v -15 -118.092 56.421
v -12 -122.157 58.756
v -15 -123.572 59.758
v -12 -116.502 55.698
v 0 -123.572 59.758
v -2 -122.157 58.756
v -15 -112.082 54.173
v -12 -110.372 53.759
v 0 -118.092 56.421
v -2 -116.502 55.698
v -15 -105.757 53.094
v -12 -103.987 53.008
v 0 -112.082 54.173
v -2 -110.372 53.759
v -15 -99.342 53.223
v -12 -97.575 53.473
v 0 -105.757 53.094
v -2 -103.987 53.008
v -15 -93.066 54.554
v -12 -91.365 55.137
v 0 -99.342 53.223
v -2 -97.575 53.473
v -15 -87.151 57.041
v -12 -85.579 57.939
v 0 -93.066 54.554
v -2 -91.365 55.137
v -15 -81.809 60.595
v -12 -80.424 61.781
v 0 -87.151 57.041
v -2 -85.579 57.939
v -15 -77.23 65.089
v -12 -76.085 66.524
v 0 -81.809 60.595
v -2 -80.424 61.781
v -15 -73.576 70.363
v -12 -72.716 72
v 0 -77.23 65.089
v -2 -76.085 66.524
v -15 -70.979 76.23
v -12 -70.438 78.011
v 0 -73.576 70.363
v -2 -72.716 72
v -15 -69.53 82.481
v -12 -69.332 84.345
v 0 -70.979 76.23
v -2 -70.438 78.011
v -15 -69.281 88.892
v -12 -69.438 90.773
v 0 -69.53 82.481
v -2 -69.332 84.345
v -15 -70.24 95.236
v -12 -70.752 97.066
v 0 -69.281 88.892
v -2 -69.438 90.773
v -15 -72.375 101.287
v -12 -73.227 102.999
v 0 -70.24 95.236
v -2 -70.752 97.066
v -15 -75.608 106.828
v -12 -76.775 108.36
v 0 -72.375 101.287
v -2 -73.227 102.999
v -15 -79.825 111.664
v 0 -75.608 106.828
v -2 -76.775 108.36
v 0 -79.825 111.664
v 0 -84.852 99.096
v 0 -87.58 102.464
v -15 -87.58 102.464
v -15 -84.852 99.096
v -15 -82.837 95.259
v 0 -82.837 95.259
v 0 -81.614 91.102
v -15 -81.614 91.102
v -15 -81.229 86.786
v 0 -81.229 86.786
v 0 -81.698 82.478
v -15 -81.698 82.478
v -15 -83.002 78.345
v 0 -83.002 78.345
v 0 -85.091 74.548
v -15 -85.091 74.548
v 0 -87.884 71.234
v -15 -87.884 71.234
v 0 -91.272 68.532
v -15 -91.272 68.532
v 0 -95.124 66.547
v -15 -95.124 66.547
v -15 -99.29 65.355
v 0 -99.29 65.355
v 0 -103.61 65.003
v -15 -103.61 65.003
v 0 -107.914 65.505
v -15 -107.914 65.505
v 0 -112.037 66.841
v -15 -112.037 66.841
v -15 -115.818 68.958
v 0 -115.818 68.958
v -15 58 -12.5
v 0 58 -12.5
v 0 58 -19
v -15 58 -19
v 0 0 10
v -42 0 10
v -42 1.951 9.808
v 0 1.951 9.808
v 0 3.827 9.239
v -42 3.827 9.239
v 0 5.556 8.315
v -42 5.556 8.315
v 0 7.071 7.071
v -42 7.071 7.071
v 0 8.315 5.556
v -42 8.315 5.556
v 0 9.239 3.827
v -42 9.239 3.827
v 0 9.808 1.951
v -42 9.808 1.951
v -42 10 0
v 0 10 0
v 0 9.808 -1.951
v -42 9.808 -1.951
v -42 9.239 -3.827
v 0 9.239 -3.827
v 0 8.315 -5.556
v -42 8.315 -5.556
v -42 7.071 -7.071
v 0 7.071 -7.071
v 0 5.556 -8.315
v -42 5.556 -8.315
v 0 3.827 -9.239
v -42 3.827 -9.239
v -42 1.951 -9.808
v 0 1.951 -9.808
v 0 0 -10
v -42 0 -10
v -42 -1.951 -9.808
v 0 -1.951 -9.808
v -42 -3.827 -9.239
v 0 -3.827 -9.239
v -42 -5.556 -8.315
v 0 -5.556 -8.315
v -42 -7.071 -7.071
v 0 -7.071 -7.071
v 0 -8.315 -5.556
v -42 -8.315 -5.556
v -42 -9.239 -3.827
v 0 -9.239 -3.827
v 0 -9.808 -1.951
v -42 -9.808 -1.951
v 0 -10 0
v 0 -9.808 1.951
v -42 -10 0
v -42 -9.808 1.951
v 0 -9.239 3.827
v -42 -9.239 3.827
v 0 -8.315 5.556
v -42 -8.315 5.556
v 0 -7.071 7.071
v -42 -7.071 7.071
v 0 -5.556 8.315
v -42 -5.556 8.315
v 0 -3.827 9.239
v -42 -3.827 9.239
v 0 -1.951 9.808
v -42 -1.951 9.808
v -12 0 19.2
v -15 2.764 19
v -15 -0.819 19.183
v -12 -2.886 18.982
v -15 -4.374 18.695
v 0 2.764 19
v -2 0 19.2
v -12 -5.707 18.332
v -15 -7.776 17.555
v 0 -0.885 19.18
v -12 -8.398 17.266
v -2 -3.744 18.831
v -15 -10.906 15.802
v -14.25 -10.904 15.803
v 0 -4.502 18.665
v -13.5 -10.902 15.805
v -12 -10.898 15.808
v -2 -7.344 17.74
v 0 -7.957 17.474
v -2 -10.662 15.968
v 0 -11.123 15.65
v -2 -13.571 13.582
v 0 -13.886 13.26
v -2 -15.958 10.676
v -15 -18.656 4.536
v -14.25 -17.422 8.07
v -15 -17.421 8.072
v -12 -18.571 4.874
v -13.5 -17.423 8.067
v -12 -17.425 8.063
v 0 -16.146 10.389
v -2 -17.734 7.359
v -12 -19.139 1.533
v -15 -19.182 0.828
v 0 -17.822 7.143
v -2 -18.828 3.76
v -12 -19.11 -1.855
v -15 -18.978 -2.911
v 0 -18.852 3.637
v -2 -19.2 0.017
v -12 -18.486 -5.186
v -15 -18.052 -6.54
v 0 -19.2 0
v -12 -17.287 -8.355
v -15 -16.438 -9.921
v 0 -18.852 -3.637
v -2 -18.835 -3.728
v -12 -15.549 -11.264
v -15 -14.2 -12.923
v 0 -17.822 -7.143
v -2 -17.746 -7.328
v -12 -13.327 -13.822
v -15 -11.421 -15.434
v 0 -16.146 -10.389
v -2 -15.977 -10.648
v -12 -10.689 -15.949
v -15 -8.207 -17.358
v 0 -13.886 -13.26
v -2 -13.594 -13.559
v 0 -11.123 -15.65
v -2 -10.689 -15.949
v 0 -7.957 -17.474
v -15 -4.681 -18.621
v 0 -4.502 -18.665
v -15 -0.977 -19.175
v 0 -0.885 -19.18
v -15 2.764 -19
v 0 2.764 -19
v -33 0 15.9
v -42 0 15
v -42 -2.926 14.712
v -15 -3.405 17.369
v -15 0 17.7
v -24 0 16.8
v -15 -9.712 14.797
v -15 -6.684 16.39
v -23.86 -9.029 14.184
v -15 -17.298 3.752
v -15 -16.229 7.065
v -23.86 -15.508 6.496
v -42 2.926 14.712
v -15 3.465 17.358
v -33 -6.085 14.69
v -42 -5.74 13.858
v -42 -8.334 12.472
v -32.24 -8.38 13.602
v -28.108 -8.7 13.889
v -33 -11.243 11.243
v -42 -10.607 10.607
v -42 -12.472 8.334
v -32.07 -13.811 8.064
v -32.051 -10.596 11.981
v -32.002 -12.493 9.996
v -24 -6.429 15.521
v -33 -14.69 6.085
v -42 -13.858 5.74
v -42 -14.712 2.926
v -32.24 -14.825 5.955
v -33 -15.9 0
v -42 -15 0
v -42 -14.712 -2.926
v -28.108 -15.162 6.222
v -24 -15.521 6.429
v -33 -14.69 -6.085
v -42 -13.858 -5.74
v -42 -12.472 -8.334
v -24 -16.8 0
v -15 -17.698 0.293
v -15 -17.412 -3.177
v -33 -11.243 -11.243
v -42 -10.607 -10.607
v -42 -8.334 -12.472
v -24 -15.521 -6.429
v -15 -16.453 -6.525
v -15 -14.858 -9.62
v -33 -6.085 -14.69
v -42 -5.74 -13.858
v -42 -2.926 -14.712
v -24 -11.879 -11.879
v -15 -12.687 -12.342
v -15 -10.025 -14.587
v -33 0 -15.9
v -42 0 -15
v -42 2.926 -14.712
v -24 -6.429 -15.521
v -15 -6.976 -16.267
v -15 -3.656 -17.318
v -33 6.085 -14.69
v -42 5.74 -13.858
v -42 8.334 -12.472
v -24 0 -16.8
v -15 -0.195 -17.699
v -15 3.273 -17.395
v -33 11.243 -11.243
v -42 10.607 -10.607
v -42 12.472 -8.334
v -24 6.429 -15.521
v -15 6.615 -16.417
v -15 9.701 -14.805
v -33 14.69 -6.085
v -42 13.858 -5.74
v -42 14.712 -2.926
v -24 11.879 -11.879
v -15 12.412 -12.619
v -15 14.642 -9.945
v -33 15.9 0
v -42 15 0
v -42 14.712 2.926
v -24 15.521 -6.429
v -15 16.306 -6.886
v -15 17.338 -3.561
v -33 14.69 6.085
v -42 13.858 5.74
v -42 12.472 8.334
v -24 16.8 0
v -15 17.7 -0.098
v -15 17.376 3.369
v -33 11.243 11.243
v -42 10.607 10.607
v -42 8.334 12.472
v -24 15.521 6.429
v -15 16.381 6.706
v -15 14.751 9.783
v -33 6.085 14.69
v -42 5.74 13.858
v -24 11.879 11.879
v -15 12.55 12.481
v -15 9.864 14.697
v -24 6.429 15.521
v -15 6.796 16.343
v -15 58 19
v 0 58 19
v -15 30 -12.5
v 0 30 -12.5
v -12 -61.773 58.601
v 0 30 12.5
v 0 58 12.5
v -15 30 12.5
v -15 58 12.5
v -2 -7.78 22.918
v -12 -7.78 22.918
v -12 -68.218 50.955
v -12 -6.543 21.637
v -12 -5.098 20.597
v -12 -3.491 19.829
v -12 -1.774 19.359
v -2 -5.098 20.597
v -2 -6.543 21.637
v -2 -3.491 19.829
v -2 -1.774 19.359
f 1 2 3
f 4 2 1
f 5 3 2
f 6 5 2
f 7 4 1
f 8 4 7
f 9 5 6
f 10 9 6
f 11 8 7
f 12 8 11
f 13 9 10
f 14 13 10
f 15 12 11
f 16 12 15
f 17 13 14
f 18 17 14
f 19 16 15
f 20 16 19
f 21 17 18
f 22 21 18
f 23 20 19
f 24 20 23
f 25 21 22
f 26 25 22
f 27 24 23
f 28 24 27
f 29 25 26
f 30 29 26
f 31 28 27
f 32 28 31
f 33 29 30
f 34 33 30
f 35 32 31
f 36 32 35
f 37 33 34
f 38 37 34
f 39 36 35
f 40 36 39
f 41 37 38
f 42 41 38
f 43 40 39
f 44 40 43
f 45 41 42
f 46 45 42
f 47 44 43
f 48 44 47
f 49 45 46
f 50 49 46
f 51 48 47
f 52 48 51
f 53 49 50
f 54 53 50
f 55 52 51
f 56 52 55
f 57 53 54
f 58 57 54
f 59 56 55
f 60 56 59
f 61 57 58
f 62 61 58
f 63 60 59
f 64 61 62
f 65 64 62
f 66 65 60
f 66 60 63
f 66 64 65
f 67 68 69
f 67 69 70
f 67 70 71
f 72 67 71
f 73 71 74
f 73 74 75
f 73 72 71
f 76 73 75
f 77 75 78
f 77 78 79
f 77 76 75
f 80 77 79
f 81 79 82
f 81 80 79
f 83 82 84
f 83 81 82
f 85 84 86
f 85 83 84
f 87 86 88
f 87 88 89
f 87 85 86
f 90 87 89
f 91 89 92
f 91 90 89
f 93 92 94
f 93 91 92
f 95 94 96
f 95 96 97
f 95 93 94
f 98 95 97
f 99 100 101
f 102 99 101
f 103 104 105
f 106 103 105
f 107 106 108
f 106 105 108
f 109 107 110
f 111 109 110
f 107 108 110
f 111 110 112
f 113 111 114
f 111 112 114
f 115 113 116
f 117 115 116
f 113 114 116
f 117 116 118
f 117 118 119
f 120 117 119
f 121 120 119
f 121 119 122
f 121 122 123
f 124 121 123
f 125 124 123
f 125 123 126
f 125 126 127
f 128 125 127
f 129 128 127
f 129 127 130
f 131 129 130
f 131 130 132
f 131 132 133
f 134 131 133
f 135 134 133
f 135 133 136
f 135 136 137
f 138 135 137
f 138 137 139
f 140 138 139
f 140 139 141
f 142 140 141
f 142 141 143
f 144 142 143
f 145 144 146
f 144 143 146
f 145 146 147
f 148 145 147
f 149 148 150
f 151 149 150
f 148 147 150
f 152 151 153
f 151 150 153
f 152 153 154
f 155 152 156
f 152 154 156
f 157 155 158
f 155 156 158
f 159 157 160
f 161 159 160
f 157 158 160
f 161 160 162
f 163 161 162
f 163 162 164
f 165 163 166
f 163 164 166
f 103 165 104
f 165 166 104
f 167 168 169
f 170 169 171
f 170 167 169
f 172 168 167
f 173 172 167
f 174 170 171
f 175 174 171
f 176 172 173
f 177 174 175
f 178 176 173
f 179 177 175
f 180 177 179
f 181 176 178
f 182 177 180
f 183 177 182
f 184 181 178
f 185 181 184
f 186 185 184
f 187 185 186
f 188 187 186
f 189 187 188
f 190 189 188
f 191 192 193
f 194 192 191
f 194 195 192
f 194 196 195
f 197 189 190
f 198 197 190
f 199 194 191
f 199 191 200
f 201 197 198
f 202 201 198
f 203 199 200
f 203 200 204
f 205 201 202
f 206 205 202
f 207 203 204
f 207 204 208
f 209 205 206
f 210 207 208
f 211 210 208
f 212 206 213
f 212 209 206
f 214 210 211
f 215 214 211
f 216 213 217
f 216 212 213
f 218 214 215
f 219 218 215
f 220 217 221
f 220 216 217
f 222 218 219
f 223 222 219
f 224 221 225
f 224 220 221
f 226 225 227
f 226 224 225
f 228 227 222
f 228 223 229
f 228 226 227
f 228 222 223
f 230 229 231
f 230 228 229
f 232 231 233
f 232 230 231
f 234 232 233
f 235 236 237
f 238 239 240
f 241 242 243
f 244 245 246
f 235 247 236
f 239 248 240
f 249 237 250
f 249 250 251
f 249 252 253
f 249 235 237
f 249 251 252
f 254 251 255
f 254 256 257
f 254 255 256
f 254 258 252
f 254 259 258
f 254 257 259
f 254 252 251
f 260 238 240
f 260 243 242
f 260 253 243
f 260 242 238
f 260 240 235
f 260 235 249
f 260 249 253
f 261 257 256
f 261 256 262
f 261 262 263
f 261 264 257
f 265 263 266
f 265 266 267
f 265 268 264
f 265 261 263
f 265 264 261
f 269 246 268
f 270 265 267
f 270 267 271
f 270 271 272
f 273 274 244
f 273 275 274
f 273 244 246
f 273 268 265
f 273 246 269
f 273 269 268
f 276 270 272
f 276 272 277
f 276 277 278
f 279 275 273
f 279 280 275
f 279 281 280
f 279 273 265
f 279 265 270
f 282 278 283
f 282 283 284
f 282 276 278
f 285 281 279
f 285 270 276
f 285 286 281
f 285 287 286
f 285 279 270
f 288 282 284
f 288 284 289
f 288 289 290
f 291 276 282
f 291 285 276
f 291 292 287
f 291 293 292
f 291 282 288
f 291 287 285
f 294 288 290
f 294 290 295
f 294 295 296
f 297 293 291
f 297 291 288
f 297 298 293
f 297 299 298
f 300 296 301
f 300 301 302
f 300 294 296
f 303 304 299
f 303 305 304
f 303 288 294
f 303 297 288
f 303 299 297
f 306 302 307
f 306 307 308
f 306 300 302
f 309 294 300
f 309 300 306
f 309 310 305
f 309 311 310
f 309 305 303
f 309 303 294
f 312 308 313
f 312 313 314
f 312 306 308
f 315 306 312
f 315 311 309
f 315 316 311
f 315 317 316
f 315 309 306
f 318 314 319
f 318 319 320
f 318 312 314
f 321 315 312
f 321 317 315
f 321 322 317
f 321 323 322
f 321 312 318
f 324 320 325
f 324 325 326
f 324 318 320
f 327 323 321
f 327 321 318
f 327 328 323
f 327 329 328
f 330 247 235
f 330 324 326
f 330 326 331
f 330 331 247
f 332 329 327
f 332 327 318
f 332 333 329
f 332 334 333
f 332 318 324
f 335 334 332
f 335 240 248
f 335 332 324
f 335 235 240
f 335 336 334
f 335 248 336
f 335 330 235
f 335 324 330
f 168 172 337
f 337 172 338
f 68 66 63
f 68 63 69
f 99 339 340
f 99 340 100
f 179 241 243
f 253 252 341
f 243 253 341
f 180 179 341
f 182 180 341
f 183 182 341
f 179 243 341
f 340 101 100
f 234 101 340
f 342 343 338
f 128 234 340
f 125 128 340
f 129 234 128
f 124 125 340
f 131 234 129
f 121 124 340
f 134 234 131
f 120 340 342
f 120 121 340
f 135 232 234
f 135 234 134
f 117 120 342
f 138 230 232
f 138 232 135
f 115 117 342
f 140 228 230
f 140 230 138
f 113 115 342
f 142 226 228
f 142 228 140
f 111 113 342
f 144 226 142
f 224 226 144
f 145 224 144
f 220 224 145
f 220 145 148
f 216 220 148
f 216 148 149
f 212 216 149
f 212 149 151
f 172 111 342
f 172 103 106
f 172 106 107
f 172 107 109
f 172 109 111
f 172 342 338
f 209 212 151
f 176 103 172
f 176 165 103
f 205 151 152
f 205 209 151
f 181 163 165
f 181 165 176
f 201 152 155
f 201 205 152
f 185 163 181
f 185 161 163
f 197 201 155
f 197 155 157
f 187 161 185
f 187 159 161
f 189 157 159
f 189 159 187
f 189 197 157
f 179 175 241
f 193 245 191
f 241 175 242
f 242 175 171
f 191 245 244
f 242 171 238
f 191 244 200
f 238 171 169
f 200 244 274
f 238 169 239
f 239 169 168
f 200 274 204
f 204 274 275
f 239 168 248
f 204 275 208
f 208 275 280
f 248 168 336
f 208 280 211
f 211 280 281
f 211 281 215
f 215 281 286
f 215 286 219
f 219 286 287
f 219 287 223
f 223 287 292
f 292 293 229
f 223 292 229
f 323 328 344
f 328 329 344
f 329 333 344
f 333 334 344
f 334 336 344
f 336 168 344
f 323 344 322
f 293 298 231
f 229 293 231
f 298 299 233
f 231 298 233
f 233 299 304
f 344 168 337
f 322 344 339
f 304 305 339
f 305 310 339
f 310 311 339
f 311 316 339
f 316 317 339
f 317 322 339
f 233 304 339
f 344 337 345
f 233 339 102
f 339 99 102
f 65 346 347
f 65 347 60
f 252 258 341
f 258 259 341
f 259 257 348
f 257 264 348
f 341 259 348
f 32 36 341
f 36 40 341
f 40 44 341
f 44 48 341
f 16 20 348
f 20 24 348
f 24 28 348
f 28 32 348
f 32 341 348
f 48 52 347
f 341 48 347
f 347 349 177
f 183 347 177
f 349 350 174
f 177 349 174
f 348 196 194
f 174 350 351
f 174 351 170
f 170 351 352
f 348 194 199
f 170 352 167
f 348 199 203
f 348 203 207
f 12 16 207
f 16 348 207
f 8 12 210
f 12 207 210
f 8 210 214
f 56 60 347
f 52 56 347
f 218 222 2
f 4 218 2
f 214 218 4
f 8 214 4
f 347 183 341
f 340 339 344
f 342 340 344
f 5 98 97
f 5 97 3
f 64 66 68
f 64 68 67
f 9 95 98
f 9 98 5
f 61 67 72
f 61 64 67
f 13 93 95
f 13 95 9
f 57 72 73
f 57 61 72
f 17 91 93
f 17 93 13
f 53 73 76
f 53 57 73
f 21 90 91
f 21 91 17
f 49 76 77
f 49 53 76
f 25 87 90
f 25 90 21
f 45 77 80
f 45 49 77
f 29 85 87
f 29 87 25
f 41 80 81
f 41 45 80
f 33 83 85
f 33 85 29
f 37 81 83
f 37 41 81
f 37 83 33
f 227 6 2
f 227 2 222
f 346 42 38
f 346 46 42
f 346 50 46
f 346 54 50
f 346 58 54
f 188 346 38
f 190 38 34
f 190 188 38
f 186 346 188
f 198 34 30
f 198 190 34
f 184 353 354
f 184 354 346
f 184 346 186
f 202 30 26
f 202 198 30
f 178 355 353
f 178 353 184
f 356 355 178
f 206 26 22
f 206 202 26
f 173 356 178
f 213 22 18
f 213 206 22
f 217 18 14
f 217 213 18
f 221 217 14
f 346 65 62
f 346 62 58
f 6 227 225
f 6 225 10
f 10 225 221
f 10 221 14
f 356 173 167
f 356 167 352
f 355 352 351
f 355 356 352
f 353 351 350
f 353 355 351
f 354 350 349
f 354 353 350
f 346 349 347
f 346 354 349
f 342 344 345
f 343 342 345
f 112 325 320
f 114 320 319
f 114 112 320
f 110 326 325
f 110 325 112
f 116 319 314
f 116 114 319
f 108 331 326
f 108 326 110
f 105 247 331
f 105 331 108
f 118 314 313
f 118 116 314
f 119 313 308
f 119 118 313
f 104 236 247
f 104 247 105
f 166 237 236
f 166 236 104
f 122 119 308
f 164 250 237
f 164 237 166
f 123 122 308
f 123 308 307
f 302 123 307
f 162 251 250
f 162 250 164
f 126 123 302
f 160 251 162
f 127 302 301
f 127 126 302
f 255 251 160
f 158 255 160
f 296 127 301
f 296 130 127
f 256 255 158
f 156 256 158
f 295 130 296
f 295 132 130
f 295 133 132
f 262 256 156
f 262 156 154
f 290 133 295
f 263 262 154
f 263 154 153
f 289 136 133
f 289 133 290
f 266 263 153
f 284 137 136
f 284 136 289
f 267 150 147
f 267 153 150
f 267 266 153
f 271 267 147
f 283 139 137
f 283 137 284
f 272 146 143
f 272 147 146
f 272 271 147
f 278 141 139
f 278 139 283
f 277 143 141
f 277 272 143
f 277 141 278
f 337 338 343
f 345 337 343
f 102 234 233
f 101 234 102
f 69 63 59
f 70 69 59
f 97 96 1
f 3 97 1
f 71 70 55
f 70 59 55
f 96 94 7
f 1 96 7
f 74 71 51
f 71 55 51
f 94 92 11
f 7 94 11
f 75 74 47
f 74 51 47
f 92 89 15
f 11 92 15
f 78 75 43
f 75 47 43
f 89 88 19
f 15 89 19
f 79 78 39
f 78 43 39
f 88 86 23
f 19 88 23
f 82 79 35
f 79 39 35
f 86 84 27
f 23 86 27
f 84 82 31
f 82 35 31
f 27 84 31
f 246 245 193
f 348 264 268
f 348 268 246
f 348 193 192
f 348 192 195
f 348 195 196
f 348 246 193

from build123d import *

# Parameters (mm, degrees)
SKETCH_4_W          = 38
SKETCH_4_H          = 58
EXTRUDE_1_DEPTH     = 15
EXTRUDE_START       = -2
EXTRUDE_2_DEPTH     = 10
EXTRUDE_3_DEPTH     = 15
SKETCH_8_R          = 19.2
EXTRUDE_4_DEPTH     = 15
RIB_4_REACH         = 173.764
SKETCH_7_WALL_W     = 417.368166338
SKETCH_7_WALL_H     = 10
RIB_4_DRAFT_ANGLE   = 0.1993373
SKETCH_9_R          = 10
CUT_EXTRUDE_1_DEPTH = 172.764033058
SKETCH_10_W         = 25
SKETCH_10_H         = 28
CUT_EXTRUDE_2_DEPTH = 169.724281158


with BuildPart() as part:
    # 草图4 → 凸台-拉伸1 (new body)
    with BuildSketch(Plane(origin=(0, 0, 0), x_dir=(0, 0, -1), z_dir=(1, 0, 0))):
        with Locations((0, 29)):
            Rectangle(SKETCH_4_W, SKETCH_4_H)
    extrude(amount=-EXTRUDE_1_DEPTH)

    # 草图2 → 旋转1 (revolve)
    with BuildSketch(Plane.XY):
        Polygon((-42, 0), (-42, 15), (0, 19.2), (0, 0), align=None)
    revolve(axis=Axis((-18.865866606, 0, 0), (1, 0, 0)))



with BuildPart() as body_2:
    # 草图5 → 凸台-拉伸2 (new body)
    with BuildSketch(Plane(origin=(0, 0, 0), x_dir=(0, 0, -1), z_dir=(1, 0, 0)).offset(EXTRUDE_START)):
        with BuildLine():
            Line((-111.66423124, -79.82543117), (-102.463778118, -87.579530564))
            ThreePointArc((-102.463778118, -87.579530564), (-72.822222222, -86.405578238), (-68.958444104, -115.817671306))
            Line((-68.958444104, -115.817671306), (-59.757990982, -123.5717707))
            Line((-59.757990982, -123.5717707), (-58.756458022, -122.156778939))
            Line((-58.756458022, -122.156778939), (15.949294293, -10.689247473))
            ThreePointArc((15.949294293, -10.689247473), (-5.586302425, -18.369355602), (-19.2, 0))
            ThreePointArc((-19.2, 0), (-20.177119331, -4.311336735), (-22.917524888, -7.780135376))
            Line((-22.917524888, -7.780135376), (-108.360415381, -76.775442927))
            Line((-108.360415381, -76.775442927), (-111.66423124, -79.82543117))
        make_face()
    extrude(amount=-EXTRUDE_2_DEPTH)

    # 草图6 → 凸台-拉伸3 (add)
    with BuildSketch(Plane(origin=(0, 0, 0), x_dir=(0, 0, -1), z_dir=(1, 0, 0))):
        with BuildLine():
            Line((-111.66423124, -79.82543117), (-102.463778118, -87.579530564))
            ThreePointArc((-102.463778118, -87.579530564), (-72.822222222, -86.405578238), (-68.958444104, -115.817671306))
            Line((-68.958444104, -115.817671306), (-59.757990982, -123.5717707))
            ThreePointArc((-59.757990982, -123.5717707), (-65.088888889, -77.22976462), (-111.66423124, -79.82543117))
        make_face()
    extrude(amount=-EXTRUDE_3_DEPTH)


with BuildPart() as part_1:
    add(part.part)

    add(body_2.part)  # 凸台-拉伸4 merges body 2
    # 草图8 → 凸台-拉伸4 (add)
    with BuildSketch(Plane(origin=(0, 0, 0), x_dir=(0, 0, -1), z_dir=(1, 0, 0))):
        Circle(SKETCH_8_R)
    extrude(amount=-EXTRUDE_4_DEPTH)

    # 草图7 wall → 筋4 (add, up to next)
    with BuildSketch(Plane(origin=(-22, -38.61488231, 32.544444445), x_dir=(0.278396048141, -0.734421696805, 0.618967213705), z_dir=(0.960466366084, 0.212875854148, -0.17941078658)), mode=Mode.PRIVATE) as rib_4_sk1:
        Rectangle(SKETCH_7_WALL_W, SKETCH_7_WALL_H)
    rib_4_tool1 = extrude(rib_4_sk1.sketch, amount=RIB_4_REACH, mode=Mode.PRIVATE) - part_1.part
    add(rib_4_tool1.solids().sort_by_distance((-22, -38.61488231, 32.544444445))[0])

    # 筋4 draft
    rib_4_draft_faces = [part_1.faces().sort_by_distance(p)[0] for p in [
        (-21.519766817, -41.730666605, 28.631483377),
        (-21.519766817, -35.286222161, 36.277994725),
    ]]
    draft(rib_4_draft_faces, Plane(origin=(-22, -38.61488231, 32.544444445), x_dir=(0.278396048141, -0.734421696805, 0.618967213705), z_dir=(-0.960466366084, -0.212875854148, 0.17941078658)), RIB_4_DRAFT_ANGLE)

    # 草图9 → 切除-拉伸1 (cut, through all)
    with BuildSketch(Plane.ZY.offset(42)):
        Circle(SKETCH_9_R)
    extrude(amount=-CUT_EXTRUDE_1_DEPTH, mode=Mode.SUBTRACT)

    # 草图10 → 切除-拉伸2 (cut, through all)
    with BuildSketch(Plane.ZY.offset(15)):
        with Locations((0, 44)):
            Rectangle(SKETCH_10_W, SKETCH_10_H)
    extrude(amount=-CUT_EXTRUDE_2_DEPTH, mode=Mode.SUBTRACT)


solid = part_1.part
